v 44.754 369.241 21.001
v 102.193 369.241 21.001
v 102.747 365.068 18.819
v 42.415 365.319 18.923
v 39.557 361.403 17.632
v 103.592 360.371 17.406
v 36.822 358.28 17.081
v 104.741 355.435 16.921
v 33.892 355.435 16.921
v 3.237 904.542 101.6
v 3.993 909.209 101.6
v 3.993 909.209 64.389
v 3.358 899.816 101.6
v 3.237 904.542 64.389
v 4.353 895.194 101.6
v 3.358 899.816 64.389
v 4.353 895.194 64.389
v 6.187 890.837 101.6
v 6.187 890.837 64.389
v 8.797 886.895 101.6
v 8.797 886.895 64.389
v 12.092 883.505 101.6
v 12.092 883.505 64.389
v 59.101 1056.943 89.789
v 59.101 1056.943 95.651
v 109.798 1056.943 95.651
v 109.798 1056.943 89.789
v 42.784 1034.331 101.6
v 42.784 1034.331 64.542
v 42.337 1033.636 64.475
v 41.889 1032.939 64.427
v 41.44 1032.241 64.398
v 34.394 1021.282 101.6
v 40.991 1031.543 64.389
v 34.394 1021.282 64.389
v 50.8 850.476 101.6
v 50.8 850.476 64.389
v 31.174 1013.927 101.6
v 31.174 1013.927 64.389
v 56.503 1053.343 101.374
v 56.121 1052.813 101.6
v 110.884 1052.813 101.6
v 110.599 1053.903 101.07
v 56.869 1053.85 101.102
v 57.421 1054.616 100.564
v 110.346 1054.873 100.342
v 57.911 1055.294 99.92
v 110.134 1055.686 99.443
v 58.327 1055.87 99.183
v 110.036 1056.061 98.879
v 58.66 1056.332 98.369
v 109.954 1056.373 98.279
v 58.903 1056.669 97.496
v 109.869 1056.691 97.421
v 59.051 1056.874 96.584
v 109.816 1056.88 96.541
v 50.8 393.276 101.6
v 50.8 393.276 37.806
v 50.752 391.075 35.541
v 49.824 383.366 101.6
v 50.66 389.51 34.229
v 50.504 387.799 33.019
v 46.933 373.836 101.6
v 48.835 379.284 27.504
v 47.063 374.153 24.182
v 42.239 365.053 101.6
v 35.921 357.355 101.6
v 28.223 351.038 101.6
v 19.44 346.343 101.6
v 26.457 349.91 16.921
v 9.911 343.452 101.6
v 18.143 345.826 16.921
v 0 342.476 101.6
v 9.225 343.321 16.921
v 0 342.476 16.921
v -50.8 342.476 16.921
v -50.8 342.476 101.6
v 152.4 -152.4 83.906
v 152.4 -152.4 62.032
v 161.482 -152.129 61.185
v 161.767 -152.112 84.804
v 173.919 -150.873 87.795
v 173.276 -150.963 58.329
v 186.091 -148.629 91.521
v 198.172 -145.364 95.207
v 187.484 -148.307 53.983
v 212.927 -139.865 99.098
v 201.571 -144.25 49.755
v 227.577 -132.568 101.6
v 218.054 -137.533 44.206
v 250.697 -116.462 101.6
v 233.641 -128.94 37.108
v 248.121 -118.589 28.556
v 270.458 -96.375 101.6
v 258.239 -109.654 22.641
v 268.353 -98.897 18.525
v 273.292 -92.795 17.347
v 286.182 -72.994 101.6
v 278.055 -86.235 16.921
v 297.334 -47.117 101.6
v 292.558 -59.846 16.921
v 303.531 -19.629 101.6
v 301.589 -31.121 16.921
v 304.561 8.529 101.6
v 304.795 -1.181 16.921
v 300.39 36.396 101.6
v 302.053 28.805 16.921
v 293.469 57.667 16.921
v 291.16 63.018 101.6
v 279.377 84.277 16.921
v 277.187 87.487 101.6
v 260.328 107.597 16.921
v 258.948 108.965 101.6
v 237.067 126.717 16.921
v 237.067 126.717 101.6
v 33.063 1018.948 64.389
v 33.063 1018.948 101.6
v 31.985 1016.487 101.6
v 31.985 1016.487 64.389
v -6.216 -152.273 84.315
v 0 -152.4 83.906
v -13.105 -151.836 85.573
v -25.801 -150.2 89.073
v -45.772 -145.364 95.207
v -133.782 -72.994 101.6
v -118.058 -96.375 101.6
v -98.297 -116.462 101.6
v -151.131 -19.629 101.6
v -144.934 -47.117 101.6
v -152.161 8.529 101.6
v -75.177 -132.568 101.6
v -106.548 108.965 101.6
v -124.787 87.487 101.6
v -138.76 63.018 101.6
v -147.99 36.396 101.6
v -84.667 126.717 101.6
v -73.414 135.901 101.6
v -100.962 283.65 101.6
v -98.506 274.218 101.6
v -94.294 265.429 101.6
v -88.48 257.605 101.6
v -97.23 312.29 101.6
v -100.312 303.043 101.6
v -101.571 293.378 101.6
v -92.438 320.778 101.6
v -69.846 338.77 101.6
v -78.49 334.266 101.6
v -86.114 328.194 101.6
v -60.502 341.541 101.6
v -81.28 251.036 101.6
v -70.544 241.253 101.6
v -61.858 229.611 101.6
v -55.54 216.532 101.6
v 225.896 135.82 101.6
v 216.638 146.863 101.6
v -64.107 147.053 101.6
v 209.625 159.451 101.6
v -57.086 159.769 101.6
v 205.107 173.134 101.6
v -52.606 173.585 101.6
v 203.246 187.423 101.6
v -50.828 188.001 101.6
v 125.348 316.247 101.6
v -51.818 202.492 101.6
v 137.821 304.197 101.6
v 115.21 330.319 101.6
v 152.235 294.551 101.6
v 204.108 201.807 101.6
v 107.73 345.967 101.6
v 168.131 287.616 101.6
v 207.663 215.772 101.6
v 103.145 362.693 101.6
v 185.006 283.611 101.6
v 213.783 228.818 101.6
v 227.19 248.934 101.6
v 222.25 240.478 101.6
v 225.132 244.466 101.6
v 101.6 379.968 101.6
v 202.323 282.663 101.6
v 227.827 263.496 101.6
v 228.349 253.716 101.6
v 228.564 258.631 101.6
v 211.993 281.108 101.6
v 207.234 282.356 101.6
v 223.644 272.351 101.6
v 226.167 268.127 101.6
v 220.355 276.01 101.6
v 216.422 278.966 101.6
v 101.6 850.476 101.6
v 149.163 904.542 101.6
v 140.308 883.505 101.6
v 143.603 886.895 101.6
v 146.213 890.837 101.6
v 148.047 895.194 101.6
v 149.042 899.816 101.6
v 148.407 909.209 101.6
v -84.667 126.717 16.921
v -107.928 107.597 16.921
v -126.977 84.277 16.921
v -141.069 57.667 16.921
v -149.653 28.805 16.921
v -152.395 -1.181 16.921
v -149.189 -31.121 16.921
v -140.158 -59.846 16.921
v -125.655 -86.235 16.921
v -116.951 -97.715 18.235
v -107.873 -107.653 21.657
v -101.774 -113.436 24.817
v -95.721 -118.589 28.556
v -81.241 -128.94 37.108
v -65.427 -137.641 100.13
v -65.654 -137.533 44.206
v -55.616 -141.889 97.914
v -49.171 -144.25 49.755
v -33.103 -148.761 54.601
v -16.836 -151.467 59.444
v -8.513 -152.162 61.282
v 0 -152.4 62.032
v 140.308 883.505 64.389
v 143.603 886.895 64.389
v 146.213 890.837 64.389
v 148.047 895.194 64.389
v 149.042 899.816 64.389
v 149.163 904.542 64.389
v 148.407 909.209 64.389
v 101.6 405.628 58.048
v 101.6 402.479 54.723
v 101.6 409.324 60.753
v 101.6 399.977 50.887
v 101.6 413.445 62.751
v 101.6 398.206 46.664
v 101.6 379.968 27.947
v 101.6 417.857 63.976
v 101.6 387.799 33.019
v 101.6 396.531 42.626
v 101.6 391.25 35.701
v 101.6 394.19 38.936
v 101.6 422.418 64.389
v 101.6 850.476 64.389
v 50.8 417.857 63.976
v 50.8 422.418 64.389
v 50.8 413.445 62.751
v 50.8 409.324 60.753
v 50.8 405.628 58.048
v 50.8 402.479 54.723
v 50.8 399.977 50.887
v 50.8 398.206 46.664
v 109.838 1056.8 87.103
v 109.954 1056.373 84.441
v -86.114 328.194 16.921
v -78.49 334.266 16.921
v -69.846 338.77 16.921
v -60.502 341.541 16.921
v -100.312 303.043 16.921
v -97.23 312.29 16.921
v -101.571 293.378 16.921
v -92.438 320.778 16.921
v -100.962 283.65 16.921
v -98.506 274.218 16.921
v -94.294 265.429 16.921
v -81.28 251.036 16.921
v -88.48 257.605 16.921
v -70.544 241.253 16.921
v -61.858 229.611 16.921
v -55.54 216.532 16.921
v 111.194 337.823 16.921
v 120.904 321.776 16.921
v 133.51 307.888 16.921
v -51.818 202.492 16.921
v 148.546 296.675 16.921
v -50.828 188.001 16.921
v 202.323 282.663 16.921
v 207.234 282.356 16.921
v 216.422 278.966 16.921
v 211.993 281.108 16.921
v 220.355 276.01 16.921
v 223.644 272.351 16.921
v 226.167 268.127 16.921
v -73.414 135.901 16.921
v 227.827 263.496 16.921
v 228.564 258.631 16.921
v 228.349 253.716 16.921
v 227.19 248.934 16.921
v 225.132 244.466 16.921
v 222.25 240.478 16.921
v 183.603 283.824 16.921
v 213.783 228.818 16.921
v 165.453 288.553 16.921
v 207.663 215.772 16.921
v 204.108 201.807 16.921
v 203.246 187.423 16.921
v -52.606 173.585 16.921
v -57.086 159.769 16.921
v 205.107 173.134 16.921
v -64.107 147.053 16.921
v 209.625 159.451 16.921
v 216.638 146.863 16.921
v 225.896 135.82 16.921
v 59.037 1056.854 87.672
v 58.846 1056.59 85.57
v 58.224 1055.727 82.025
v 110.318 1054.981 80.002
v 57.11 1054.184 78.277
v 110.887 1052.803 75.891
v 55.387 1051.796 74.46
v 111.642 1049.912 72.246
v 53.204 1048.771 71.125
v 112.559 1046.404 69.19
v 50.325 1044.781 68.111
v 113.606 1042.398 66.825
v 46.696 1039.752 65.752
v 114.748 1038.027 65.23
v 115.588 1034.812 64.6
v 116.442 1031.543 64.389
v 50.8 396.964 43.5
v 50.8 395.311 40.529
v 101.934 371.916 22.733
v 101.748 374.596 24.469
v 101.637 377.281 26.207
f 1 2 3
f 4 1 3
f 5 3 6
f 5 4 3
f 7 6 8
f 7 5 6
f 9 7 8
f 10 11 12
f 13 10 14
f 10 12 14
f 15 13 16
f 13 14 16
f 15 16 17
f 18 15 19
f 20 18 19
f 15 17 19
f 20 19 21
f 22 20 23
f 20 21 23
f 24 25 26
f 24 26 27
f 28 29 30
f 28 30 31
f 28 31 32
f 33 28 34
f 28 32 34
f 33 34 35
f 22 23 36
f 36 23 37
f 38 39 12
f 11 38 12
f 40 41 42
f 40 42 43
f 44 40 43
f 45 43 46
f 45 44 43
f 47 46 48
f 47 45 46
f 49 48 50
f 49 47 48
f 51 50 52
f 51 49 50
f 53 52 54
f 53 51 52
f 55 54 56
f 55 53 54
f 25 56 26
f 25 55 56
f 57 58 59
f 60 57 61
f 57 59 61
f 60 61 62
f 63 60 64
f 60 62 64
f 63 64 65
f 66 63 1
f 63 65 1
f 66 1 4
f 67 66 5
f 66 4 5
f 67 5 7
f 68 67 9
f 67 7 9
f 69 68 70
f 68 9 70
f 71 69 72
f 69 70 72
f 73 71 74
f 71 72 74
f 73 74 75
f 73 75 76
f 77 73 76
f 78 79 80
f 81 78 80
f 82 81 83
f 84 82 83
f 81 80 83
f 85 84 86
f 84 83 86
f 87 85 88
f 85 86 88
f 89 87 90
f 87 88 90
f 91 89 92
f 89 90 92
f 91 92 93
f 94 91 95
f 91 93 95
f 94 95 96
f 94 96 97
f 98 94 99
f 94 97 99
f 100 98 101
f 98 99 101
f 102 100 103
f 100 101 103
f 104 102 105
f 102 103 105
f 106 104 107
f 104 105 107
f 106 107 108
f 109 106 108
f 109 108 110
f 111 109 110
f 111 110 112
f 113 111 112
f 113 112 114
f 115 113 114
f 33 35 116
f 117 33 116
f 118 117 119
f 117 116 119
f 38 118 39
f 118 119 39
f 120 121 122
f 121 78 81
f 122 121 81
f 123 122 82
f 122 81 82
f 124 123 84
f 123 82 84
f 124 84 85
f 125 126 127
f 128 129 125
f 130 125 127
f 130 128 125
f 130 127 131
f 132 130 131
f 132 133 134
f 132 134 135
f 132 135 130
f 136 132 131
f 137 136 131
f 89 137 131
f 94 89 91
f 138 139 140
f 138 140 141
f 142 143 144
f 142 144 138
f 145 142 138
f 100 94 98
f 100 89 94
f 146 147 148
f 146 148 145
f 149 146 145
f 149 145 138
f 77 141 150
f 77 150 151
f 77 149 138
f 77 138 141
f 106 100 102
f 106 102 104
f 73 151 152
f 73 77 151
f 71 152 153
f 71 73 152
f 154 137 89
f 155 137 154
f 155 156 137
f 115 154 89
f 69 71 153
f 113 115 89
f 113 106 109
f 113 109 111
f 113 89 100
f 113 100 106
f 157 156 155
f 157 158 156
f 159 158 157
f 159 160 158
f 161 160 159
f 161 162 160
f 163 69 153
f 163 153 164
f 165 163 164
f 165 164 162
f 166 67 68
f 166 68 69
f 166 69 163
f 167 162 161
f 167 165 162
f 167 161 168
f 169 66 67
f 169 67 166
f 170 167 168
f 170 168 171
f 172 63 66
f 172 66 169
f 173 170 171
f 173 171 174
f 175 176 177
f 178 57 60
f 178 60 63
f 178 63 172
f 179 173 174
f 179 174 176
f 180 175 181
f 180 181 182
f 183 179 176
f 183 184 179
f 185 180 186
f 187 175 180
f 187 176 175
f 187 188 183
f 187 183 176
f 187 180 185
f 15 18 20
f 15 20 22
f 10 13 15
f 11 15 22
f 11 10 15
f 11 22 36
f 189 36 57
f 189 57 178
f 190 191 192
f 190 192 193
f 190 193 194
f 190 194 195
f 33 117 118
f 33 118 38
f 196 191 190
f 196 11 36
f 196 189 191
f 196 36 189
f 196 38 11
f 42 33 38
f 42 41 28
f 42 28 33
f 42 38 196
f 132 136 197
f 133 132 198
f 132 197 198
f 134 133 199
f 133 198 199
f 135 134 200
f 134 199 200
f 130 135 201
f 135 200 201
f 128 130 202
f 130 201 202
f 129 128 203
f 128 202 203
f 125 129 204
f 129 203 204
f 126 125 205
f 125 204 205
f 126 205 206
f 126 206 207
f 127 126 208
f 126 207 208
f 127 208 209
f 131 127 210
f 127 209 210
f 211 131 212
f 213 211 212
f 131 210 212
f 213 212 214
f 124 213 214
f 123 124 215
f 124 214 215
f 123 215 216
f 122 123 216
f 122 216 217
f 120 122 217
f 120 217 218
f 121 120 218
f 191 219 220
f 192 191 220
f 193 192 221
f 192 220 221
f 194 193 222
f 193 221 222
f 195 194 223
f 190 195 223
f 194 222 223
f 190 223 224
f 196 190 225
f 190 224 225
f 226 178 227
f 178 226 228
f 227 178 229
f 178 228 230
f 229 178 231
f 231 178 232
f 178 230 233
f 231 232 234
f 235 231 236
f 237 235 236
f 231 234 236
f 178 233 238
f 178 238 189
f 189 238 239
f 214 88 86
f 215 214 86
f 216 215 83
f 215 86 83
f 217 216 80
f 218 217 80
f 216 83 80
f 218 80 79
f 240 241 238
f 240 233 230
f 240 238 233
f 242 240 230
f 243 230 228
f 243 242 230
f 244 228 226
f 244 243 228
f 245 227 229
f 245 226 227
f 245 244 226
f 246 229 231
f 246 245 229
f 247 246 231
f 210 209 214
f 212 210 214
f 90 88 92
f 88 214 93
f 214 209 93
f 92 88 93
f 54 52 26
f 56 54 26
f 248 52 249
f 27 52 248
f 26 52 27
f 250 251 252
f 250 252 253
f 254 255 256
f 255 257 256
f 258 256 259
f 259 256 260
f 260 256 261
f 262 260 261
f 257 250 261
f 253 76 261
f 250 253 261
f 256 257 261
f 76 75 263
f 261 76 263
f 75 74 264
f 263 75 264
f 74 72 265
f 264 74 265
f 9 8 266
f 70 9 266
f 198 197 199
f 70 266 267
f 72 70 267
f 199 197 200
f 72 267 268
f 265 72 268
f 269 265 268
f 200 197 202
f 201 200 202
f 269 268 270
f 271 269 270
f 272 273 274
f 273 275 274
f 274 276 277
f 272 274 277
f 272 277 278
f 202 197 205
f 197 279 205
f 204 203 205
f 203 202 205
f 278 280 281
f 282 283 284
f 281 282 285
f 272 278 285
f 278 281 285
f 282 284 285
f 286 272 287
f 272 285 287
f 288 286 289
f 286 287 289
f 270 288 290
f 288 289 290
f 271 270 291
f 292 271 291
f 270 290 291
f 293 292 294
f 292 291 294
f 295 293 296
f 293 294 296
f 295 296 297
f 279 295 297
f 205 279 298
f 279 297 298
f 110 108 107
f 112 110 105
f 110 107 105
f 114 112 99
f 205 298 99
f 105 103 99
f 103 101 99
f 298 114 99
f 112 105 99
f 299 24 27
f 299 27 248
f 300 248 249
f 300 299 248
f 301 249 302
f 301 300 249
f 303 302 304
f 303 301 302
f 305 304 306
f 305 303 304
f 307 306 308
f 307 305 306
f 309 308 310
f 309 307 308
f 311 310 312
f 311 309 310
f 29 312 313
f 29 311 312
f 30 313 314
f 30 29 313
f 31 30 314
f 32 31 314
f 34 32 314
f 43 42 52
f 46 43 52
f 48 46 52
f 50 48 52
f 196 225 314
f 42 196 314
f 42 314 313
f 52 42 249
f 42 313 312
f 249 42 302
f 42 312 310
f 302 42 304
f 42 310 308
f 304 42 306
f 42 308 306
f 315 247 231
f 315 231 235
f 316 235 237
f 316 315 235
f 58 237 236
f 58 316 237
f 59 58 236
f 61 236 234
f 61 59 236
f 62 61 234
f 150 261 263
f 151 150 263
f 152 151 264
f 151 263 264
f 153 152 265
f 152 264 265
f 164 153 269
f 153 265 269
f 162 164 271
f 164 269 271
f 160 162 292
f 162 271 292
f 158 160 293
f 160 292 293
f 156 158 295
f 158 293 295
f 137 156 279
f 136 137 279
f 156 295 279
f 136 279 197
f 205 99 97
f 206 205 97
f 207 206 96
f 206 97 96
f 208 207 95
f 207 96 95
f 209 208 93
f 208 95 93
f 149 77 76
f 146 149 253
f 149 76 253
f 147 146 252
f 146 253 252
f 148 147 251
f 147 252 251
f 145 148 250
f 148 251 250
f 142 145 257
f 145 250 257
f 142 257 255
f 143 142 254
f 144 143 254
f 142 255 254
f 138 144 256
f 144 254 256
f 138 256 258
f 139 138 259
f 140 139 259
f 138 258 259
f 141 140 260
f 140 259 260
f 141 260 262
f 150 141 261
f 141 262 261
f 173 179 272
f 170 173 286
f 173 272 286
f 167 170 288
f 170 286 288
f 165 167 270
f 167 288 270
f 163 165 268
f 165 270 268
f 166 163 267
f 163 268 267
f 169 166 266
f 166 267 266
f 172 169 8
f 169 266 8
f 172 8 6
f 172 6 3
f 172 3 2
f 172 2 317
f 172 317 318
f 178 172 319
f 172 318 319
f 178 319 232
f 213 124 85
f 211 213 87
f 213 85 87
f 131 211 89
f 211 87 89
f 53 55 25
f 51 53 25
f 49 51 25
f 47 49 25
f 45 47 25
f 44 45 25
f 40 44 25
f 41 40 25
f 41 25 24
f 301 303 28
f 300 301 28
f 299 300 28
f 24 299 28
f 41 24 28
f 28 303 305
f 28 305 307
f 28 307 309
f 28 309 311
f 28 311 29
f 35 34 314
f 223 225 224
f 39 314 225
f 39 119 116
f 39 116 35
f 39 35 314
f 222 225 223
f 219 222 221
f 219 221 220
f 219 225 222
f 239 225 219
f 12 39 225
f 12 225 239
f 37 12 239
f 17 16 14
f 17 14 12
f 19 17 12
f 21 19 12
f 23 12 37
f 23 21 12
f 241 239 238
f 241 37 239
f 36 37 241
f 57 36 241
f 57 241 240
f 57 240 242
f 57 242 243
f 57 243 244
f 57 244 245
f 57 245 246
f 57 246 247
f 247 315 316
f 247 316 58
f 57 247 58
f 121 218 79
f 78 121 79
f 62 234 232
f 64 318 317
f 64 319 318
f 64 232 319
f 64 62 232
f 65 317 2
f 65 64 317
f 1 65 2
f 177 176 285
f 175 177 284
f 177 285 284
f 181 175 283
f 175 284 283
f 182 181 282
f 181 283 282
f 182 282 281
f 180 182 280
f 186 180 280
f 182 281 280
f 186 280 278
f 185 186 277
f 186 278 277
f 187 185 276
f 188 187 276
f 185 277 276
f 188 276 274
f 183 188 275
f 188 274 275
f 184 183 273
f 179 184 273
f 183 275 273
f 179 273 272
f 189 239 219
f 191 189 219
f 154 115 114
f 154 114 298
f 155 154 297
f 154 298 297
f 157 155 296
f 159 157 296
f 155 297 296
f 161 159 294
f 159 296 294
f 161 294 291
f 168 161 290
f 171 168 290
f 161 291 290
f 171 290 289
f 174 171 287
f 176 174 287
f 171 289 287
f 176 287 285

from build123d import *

# Parameters (mm, degrees)
F1_DEPTH = 101.6
F2_W     = 1257.021352
F2_H     = 189.658009
F3_DEPTH = 304.801
F4_DEPTH = 152.401


with BuildPart() as f1:
    # F0 (on Top) → F1 (new body)
    with BuildSketch(Plane.XY):
        with BuildLine():
            ThreePointArc((-81.28, 251.036195), (-50.828259, 188.00114), (-84.666667, 126.717463))
            ThreePointArc((-84.666667, 126.717463), (-145.838098, -44.238098), (0, -152.4))
            Line((0, -152.4), (152.4, -152.4))
            ThreePointArc((152.4, -152.4), (298.238098, -44.238098), (237.066667, 126.717463))
            ThreePointArc((237.066667, 126.717463), (203.838207, 180.234678), (222.25, 240.477758))
            ThreePointArc((222.25, 240.477758), (226.166681, 268.126854), (202.32325, 282.663142))
            ThreePointArc((202.32325, 282.663142), (131.315454, 309.943826), (101.6, 379.96764))
            Line((101.6, 379.96764), (101.6, 850.476195))
            Line((101.6, 850.476195), (140.308257, 883.505244))
            ThreePointArc((140.308257, 883.505244), (148.047216, 895.194332), (148.406537, 909.208509))
            Line((148.406537, 909.208509), (109.953977, 1056.373323))
            ThreePointArc((109.953977, 1056.373323), (90.045146, 1074.919879), (64.781823, 1064.815382))
            Line((64.781823, 1064.815382), (42.783839, 1034.330968))
            Line((42.783839, 1034.330968), (34.39404, 1021.281634))
            ThreePointArc((34.39404, 1021.281634), (32.491534, 1017.732173), (31.173938, 1013.926632))
            Line((31.173938, 1013.926632), (3.993463, 909.208509))
            ThreePointArc((3.993463, 909.208509), (4.352784, 895.194332), (12.091743, 883.505244))
            Line((12.091743, 883.505244), (50.8, 850.476195))
            Line((50.8, 850.476195), (50.8, 393.276195))
            ThreePointArc((50.8, 393.276195), (35.921024, 357.355171), (0, 342.476195))
            Line((0, 342.476195), (-50.8, 342.476195))
            ThreePointArc((-50.8, 342.476195), (-98.993112, 307.740566), (-81.28, 251.036195))
        make_face()
    extrude(amount=F1_DEPTH)

    # F2 (on Right) → F3 (cut, through all)
    with BuildSketch(Plane.YZ):
        with Locations((456.159748, 22.18328)):
            Rectangle(F2_W, F2_H)
        with BuildLine():
            ThreePointArc((1056.942703, 89.788765), (1049.503216, 71.828253), (1031.542703, 64.388765))
            Line((1031.542703, 64.388765), (422.418403, 64.388765))
            ThreePointArc((422.418403, 64.388765), (407.414851, 59.48397), (398.205736, 46.663839))
            ThreePointArc((398.205736, 46.663839), (394.189746, 38.935854), (387.799281, 33.01877))
            Line((387.799281, 33.01877), (369.241137, 21.001137))
            ThreePointArc((369.241137, 21.001137), (362.633132, 17.962589), (355.434925, 16.92128))
            Line((355.434925, 16.92128), (-86.235178, 16.92128))
            ThreePointArc((-86.235178, 16.92128), (-103.426242, 19.918484), (-118.588758, 28.556425))
            Line((-118.588758, 28.556425), (-144.24981, 49.754688))
            ThreePointArc((-144.24981, 49.754688), (-151.051819, 58.514234), (-153.47302, 69.337115))
            Line((-153.47302, 69.337115), (-153.47302, 76.600858))
            ThreePointArc((-153.47302, 76.600858), (-151.357661, 86.749034), (-145.363926, 95.206893))
            ThreePointArc((-145.363926, 95.206893), (-137.361903, 100.24143), (-128.07302, 102.000858))
            Line((-128.07302, 102.000858), (1050.592703, 102.000858))
            ThreePointArc((1050.592703, 102.000858), (1055.082831, 100.140986), (1056.942703, 95.650858))
            Line((1056.942703, 95.650858), (1056.942703, 89.788765))
        make_face(mode=Mode.SUBTRACT)
    extrude(amount=F3_DEPTH, mode=Mode.SUBTRACT)

    # F2 (on Right) → F4 (cut, through all)
    with BuildSketch(Plane.YZ):
        with Locations((456.159748, 22.18328)):
            Rectangle(F2_W, F2_H)
        with BuildLine():
            ThreePointArc((1056.942703, 89.788765), (1049.503216, 71.828253), (1031.542703, 64.388765))
            Line((1031.542703, 64.388765), (422.418403, 64.388765))
            ThreePointArc((422.418403, 64.388765), (407.414851, 59.48397), (398.205736, 46.663839))
            ThreePointArc((398.205736, 46.663839), (394.189746, 38.935854), (387.799281, 33.01877))
            Line((387.799281, 33.01877), (369.241137, 21.001137))
            ThreePointArc((369.241137, 21.001137), (362.633132, 17.962589), (355.434925, 16.92128))
            Line((355.434925, 16.92128), (-86.235178, 16.92128))
            ThreePointArc((-86.235178, 16.92128), (-103.426242, 19.918484), (-118.588758, 28.556425))
            Line((-118.588758, 28.556425), (-144.24981, 49.754688))
            ThreePointArc((-144.24981, 49.754688), (-151.051819, 58.514234), (-153.47302, 69.337115))
            Line((-153.47302, 69.337115), (-153.47302, 76.600858))
            ThreePointArc((-153.47302, 76.600858), (-151.357661, 86.749034), (-145.363926, 95.206893))
            ThreePointArc((-145.363926, 95.206893), (-137.361903, 100.24143), (-128.07302, 102.000858))
            Line((-128.07302, 102.000858), (1050.592703, 102.000858))
            ThreePointArc((1050.592703, 102.000858), (1055.082831, 100.140986), (1056.942703, 95.650858))
            Line((1056.942703, 95.650858), (1056.942703, 89.788765))
        make_face(mode=Mode.SUBTRACT)
    extrude(amount=-F4_DEPTH, mode=Mode.SUBTRACT)


solid = f1.part
